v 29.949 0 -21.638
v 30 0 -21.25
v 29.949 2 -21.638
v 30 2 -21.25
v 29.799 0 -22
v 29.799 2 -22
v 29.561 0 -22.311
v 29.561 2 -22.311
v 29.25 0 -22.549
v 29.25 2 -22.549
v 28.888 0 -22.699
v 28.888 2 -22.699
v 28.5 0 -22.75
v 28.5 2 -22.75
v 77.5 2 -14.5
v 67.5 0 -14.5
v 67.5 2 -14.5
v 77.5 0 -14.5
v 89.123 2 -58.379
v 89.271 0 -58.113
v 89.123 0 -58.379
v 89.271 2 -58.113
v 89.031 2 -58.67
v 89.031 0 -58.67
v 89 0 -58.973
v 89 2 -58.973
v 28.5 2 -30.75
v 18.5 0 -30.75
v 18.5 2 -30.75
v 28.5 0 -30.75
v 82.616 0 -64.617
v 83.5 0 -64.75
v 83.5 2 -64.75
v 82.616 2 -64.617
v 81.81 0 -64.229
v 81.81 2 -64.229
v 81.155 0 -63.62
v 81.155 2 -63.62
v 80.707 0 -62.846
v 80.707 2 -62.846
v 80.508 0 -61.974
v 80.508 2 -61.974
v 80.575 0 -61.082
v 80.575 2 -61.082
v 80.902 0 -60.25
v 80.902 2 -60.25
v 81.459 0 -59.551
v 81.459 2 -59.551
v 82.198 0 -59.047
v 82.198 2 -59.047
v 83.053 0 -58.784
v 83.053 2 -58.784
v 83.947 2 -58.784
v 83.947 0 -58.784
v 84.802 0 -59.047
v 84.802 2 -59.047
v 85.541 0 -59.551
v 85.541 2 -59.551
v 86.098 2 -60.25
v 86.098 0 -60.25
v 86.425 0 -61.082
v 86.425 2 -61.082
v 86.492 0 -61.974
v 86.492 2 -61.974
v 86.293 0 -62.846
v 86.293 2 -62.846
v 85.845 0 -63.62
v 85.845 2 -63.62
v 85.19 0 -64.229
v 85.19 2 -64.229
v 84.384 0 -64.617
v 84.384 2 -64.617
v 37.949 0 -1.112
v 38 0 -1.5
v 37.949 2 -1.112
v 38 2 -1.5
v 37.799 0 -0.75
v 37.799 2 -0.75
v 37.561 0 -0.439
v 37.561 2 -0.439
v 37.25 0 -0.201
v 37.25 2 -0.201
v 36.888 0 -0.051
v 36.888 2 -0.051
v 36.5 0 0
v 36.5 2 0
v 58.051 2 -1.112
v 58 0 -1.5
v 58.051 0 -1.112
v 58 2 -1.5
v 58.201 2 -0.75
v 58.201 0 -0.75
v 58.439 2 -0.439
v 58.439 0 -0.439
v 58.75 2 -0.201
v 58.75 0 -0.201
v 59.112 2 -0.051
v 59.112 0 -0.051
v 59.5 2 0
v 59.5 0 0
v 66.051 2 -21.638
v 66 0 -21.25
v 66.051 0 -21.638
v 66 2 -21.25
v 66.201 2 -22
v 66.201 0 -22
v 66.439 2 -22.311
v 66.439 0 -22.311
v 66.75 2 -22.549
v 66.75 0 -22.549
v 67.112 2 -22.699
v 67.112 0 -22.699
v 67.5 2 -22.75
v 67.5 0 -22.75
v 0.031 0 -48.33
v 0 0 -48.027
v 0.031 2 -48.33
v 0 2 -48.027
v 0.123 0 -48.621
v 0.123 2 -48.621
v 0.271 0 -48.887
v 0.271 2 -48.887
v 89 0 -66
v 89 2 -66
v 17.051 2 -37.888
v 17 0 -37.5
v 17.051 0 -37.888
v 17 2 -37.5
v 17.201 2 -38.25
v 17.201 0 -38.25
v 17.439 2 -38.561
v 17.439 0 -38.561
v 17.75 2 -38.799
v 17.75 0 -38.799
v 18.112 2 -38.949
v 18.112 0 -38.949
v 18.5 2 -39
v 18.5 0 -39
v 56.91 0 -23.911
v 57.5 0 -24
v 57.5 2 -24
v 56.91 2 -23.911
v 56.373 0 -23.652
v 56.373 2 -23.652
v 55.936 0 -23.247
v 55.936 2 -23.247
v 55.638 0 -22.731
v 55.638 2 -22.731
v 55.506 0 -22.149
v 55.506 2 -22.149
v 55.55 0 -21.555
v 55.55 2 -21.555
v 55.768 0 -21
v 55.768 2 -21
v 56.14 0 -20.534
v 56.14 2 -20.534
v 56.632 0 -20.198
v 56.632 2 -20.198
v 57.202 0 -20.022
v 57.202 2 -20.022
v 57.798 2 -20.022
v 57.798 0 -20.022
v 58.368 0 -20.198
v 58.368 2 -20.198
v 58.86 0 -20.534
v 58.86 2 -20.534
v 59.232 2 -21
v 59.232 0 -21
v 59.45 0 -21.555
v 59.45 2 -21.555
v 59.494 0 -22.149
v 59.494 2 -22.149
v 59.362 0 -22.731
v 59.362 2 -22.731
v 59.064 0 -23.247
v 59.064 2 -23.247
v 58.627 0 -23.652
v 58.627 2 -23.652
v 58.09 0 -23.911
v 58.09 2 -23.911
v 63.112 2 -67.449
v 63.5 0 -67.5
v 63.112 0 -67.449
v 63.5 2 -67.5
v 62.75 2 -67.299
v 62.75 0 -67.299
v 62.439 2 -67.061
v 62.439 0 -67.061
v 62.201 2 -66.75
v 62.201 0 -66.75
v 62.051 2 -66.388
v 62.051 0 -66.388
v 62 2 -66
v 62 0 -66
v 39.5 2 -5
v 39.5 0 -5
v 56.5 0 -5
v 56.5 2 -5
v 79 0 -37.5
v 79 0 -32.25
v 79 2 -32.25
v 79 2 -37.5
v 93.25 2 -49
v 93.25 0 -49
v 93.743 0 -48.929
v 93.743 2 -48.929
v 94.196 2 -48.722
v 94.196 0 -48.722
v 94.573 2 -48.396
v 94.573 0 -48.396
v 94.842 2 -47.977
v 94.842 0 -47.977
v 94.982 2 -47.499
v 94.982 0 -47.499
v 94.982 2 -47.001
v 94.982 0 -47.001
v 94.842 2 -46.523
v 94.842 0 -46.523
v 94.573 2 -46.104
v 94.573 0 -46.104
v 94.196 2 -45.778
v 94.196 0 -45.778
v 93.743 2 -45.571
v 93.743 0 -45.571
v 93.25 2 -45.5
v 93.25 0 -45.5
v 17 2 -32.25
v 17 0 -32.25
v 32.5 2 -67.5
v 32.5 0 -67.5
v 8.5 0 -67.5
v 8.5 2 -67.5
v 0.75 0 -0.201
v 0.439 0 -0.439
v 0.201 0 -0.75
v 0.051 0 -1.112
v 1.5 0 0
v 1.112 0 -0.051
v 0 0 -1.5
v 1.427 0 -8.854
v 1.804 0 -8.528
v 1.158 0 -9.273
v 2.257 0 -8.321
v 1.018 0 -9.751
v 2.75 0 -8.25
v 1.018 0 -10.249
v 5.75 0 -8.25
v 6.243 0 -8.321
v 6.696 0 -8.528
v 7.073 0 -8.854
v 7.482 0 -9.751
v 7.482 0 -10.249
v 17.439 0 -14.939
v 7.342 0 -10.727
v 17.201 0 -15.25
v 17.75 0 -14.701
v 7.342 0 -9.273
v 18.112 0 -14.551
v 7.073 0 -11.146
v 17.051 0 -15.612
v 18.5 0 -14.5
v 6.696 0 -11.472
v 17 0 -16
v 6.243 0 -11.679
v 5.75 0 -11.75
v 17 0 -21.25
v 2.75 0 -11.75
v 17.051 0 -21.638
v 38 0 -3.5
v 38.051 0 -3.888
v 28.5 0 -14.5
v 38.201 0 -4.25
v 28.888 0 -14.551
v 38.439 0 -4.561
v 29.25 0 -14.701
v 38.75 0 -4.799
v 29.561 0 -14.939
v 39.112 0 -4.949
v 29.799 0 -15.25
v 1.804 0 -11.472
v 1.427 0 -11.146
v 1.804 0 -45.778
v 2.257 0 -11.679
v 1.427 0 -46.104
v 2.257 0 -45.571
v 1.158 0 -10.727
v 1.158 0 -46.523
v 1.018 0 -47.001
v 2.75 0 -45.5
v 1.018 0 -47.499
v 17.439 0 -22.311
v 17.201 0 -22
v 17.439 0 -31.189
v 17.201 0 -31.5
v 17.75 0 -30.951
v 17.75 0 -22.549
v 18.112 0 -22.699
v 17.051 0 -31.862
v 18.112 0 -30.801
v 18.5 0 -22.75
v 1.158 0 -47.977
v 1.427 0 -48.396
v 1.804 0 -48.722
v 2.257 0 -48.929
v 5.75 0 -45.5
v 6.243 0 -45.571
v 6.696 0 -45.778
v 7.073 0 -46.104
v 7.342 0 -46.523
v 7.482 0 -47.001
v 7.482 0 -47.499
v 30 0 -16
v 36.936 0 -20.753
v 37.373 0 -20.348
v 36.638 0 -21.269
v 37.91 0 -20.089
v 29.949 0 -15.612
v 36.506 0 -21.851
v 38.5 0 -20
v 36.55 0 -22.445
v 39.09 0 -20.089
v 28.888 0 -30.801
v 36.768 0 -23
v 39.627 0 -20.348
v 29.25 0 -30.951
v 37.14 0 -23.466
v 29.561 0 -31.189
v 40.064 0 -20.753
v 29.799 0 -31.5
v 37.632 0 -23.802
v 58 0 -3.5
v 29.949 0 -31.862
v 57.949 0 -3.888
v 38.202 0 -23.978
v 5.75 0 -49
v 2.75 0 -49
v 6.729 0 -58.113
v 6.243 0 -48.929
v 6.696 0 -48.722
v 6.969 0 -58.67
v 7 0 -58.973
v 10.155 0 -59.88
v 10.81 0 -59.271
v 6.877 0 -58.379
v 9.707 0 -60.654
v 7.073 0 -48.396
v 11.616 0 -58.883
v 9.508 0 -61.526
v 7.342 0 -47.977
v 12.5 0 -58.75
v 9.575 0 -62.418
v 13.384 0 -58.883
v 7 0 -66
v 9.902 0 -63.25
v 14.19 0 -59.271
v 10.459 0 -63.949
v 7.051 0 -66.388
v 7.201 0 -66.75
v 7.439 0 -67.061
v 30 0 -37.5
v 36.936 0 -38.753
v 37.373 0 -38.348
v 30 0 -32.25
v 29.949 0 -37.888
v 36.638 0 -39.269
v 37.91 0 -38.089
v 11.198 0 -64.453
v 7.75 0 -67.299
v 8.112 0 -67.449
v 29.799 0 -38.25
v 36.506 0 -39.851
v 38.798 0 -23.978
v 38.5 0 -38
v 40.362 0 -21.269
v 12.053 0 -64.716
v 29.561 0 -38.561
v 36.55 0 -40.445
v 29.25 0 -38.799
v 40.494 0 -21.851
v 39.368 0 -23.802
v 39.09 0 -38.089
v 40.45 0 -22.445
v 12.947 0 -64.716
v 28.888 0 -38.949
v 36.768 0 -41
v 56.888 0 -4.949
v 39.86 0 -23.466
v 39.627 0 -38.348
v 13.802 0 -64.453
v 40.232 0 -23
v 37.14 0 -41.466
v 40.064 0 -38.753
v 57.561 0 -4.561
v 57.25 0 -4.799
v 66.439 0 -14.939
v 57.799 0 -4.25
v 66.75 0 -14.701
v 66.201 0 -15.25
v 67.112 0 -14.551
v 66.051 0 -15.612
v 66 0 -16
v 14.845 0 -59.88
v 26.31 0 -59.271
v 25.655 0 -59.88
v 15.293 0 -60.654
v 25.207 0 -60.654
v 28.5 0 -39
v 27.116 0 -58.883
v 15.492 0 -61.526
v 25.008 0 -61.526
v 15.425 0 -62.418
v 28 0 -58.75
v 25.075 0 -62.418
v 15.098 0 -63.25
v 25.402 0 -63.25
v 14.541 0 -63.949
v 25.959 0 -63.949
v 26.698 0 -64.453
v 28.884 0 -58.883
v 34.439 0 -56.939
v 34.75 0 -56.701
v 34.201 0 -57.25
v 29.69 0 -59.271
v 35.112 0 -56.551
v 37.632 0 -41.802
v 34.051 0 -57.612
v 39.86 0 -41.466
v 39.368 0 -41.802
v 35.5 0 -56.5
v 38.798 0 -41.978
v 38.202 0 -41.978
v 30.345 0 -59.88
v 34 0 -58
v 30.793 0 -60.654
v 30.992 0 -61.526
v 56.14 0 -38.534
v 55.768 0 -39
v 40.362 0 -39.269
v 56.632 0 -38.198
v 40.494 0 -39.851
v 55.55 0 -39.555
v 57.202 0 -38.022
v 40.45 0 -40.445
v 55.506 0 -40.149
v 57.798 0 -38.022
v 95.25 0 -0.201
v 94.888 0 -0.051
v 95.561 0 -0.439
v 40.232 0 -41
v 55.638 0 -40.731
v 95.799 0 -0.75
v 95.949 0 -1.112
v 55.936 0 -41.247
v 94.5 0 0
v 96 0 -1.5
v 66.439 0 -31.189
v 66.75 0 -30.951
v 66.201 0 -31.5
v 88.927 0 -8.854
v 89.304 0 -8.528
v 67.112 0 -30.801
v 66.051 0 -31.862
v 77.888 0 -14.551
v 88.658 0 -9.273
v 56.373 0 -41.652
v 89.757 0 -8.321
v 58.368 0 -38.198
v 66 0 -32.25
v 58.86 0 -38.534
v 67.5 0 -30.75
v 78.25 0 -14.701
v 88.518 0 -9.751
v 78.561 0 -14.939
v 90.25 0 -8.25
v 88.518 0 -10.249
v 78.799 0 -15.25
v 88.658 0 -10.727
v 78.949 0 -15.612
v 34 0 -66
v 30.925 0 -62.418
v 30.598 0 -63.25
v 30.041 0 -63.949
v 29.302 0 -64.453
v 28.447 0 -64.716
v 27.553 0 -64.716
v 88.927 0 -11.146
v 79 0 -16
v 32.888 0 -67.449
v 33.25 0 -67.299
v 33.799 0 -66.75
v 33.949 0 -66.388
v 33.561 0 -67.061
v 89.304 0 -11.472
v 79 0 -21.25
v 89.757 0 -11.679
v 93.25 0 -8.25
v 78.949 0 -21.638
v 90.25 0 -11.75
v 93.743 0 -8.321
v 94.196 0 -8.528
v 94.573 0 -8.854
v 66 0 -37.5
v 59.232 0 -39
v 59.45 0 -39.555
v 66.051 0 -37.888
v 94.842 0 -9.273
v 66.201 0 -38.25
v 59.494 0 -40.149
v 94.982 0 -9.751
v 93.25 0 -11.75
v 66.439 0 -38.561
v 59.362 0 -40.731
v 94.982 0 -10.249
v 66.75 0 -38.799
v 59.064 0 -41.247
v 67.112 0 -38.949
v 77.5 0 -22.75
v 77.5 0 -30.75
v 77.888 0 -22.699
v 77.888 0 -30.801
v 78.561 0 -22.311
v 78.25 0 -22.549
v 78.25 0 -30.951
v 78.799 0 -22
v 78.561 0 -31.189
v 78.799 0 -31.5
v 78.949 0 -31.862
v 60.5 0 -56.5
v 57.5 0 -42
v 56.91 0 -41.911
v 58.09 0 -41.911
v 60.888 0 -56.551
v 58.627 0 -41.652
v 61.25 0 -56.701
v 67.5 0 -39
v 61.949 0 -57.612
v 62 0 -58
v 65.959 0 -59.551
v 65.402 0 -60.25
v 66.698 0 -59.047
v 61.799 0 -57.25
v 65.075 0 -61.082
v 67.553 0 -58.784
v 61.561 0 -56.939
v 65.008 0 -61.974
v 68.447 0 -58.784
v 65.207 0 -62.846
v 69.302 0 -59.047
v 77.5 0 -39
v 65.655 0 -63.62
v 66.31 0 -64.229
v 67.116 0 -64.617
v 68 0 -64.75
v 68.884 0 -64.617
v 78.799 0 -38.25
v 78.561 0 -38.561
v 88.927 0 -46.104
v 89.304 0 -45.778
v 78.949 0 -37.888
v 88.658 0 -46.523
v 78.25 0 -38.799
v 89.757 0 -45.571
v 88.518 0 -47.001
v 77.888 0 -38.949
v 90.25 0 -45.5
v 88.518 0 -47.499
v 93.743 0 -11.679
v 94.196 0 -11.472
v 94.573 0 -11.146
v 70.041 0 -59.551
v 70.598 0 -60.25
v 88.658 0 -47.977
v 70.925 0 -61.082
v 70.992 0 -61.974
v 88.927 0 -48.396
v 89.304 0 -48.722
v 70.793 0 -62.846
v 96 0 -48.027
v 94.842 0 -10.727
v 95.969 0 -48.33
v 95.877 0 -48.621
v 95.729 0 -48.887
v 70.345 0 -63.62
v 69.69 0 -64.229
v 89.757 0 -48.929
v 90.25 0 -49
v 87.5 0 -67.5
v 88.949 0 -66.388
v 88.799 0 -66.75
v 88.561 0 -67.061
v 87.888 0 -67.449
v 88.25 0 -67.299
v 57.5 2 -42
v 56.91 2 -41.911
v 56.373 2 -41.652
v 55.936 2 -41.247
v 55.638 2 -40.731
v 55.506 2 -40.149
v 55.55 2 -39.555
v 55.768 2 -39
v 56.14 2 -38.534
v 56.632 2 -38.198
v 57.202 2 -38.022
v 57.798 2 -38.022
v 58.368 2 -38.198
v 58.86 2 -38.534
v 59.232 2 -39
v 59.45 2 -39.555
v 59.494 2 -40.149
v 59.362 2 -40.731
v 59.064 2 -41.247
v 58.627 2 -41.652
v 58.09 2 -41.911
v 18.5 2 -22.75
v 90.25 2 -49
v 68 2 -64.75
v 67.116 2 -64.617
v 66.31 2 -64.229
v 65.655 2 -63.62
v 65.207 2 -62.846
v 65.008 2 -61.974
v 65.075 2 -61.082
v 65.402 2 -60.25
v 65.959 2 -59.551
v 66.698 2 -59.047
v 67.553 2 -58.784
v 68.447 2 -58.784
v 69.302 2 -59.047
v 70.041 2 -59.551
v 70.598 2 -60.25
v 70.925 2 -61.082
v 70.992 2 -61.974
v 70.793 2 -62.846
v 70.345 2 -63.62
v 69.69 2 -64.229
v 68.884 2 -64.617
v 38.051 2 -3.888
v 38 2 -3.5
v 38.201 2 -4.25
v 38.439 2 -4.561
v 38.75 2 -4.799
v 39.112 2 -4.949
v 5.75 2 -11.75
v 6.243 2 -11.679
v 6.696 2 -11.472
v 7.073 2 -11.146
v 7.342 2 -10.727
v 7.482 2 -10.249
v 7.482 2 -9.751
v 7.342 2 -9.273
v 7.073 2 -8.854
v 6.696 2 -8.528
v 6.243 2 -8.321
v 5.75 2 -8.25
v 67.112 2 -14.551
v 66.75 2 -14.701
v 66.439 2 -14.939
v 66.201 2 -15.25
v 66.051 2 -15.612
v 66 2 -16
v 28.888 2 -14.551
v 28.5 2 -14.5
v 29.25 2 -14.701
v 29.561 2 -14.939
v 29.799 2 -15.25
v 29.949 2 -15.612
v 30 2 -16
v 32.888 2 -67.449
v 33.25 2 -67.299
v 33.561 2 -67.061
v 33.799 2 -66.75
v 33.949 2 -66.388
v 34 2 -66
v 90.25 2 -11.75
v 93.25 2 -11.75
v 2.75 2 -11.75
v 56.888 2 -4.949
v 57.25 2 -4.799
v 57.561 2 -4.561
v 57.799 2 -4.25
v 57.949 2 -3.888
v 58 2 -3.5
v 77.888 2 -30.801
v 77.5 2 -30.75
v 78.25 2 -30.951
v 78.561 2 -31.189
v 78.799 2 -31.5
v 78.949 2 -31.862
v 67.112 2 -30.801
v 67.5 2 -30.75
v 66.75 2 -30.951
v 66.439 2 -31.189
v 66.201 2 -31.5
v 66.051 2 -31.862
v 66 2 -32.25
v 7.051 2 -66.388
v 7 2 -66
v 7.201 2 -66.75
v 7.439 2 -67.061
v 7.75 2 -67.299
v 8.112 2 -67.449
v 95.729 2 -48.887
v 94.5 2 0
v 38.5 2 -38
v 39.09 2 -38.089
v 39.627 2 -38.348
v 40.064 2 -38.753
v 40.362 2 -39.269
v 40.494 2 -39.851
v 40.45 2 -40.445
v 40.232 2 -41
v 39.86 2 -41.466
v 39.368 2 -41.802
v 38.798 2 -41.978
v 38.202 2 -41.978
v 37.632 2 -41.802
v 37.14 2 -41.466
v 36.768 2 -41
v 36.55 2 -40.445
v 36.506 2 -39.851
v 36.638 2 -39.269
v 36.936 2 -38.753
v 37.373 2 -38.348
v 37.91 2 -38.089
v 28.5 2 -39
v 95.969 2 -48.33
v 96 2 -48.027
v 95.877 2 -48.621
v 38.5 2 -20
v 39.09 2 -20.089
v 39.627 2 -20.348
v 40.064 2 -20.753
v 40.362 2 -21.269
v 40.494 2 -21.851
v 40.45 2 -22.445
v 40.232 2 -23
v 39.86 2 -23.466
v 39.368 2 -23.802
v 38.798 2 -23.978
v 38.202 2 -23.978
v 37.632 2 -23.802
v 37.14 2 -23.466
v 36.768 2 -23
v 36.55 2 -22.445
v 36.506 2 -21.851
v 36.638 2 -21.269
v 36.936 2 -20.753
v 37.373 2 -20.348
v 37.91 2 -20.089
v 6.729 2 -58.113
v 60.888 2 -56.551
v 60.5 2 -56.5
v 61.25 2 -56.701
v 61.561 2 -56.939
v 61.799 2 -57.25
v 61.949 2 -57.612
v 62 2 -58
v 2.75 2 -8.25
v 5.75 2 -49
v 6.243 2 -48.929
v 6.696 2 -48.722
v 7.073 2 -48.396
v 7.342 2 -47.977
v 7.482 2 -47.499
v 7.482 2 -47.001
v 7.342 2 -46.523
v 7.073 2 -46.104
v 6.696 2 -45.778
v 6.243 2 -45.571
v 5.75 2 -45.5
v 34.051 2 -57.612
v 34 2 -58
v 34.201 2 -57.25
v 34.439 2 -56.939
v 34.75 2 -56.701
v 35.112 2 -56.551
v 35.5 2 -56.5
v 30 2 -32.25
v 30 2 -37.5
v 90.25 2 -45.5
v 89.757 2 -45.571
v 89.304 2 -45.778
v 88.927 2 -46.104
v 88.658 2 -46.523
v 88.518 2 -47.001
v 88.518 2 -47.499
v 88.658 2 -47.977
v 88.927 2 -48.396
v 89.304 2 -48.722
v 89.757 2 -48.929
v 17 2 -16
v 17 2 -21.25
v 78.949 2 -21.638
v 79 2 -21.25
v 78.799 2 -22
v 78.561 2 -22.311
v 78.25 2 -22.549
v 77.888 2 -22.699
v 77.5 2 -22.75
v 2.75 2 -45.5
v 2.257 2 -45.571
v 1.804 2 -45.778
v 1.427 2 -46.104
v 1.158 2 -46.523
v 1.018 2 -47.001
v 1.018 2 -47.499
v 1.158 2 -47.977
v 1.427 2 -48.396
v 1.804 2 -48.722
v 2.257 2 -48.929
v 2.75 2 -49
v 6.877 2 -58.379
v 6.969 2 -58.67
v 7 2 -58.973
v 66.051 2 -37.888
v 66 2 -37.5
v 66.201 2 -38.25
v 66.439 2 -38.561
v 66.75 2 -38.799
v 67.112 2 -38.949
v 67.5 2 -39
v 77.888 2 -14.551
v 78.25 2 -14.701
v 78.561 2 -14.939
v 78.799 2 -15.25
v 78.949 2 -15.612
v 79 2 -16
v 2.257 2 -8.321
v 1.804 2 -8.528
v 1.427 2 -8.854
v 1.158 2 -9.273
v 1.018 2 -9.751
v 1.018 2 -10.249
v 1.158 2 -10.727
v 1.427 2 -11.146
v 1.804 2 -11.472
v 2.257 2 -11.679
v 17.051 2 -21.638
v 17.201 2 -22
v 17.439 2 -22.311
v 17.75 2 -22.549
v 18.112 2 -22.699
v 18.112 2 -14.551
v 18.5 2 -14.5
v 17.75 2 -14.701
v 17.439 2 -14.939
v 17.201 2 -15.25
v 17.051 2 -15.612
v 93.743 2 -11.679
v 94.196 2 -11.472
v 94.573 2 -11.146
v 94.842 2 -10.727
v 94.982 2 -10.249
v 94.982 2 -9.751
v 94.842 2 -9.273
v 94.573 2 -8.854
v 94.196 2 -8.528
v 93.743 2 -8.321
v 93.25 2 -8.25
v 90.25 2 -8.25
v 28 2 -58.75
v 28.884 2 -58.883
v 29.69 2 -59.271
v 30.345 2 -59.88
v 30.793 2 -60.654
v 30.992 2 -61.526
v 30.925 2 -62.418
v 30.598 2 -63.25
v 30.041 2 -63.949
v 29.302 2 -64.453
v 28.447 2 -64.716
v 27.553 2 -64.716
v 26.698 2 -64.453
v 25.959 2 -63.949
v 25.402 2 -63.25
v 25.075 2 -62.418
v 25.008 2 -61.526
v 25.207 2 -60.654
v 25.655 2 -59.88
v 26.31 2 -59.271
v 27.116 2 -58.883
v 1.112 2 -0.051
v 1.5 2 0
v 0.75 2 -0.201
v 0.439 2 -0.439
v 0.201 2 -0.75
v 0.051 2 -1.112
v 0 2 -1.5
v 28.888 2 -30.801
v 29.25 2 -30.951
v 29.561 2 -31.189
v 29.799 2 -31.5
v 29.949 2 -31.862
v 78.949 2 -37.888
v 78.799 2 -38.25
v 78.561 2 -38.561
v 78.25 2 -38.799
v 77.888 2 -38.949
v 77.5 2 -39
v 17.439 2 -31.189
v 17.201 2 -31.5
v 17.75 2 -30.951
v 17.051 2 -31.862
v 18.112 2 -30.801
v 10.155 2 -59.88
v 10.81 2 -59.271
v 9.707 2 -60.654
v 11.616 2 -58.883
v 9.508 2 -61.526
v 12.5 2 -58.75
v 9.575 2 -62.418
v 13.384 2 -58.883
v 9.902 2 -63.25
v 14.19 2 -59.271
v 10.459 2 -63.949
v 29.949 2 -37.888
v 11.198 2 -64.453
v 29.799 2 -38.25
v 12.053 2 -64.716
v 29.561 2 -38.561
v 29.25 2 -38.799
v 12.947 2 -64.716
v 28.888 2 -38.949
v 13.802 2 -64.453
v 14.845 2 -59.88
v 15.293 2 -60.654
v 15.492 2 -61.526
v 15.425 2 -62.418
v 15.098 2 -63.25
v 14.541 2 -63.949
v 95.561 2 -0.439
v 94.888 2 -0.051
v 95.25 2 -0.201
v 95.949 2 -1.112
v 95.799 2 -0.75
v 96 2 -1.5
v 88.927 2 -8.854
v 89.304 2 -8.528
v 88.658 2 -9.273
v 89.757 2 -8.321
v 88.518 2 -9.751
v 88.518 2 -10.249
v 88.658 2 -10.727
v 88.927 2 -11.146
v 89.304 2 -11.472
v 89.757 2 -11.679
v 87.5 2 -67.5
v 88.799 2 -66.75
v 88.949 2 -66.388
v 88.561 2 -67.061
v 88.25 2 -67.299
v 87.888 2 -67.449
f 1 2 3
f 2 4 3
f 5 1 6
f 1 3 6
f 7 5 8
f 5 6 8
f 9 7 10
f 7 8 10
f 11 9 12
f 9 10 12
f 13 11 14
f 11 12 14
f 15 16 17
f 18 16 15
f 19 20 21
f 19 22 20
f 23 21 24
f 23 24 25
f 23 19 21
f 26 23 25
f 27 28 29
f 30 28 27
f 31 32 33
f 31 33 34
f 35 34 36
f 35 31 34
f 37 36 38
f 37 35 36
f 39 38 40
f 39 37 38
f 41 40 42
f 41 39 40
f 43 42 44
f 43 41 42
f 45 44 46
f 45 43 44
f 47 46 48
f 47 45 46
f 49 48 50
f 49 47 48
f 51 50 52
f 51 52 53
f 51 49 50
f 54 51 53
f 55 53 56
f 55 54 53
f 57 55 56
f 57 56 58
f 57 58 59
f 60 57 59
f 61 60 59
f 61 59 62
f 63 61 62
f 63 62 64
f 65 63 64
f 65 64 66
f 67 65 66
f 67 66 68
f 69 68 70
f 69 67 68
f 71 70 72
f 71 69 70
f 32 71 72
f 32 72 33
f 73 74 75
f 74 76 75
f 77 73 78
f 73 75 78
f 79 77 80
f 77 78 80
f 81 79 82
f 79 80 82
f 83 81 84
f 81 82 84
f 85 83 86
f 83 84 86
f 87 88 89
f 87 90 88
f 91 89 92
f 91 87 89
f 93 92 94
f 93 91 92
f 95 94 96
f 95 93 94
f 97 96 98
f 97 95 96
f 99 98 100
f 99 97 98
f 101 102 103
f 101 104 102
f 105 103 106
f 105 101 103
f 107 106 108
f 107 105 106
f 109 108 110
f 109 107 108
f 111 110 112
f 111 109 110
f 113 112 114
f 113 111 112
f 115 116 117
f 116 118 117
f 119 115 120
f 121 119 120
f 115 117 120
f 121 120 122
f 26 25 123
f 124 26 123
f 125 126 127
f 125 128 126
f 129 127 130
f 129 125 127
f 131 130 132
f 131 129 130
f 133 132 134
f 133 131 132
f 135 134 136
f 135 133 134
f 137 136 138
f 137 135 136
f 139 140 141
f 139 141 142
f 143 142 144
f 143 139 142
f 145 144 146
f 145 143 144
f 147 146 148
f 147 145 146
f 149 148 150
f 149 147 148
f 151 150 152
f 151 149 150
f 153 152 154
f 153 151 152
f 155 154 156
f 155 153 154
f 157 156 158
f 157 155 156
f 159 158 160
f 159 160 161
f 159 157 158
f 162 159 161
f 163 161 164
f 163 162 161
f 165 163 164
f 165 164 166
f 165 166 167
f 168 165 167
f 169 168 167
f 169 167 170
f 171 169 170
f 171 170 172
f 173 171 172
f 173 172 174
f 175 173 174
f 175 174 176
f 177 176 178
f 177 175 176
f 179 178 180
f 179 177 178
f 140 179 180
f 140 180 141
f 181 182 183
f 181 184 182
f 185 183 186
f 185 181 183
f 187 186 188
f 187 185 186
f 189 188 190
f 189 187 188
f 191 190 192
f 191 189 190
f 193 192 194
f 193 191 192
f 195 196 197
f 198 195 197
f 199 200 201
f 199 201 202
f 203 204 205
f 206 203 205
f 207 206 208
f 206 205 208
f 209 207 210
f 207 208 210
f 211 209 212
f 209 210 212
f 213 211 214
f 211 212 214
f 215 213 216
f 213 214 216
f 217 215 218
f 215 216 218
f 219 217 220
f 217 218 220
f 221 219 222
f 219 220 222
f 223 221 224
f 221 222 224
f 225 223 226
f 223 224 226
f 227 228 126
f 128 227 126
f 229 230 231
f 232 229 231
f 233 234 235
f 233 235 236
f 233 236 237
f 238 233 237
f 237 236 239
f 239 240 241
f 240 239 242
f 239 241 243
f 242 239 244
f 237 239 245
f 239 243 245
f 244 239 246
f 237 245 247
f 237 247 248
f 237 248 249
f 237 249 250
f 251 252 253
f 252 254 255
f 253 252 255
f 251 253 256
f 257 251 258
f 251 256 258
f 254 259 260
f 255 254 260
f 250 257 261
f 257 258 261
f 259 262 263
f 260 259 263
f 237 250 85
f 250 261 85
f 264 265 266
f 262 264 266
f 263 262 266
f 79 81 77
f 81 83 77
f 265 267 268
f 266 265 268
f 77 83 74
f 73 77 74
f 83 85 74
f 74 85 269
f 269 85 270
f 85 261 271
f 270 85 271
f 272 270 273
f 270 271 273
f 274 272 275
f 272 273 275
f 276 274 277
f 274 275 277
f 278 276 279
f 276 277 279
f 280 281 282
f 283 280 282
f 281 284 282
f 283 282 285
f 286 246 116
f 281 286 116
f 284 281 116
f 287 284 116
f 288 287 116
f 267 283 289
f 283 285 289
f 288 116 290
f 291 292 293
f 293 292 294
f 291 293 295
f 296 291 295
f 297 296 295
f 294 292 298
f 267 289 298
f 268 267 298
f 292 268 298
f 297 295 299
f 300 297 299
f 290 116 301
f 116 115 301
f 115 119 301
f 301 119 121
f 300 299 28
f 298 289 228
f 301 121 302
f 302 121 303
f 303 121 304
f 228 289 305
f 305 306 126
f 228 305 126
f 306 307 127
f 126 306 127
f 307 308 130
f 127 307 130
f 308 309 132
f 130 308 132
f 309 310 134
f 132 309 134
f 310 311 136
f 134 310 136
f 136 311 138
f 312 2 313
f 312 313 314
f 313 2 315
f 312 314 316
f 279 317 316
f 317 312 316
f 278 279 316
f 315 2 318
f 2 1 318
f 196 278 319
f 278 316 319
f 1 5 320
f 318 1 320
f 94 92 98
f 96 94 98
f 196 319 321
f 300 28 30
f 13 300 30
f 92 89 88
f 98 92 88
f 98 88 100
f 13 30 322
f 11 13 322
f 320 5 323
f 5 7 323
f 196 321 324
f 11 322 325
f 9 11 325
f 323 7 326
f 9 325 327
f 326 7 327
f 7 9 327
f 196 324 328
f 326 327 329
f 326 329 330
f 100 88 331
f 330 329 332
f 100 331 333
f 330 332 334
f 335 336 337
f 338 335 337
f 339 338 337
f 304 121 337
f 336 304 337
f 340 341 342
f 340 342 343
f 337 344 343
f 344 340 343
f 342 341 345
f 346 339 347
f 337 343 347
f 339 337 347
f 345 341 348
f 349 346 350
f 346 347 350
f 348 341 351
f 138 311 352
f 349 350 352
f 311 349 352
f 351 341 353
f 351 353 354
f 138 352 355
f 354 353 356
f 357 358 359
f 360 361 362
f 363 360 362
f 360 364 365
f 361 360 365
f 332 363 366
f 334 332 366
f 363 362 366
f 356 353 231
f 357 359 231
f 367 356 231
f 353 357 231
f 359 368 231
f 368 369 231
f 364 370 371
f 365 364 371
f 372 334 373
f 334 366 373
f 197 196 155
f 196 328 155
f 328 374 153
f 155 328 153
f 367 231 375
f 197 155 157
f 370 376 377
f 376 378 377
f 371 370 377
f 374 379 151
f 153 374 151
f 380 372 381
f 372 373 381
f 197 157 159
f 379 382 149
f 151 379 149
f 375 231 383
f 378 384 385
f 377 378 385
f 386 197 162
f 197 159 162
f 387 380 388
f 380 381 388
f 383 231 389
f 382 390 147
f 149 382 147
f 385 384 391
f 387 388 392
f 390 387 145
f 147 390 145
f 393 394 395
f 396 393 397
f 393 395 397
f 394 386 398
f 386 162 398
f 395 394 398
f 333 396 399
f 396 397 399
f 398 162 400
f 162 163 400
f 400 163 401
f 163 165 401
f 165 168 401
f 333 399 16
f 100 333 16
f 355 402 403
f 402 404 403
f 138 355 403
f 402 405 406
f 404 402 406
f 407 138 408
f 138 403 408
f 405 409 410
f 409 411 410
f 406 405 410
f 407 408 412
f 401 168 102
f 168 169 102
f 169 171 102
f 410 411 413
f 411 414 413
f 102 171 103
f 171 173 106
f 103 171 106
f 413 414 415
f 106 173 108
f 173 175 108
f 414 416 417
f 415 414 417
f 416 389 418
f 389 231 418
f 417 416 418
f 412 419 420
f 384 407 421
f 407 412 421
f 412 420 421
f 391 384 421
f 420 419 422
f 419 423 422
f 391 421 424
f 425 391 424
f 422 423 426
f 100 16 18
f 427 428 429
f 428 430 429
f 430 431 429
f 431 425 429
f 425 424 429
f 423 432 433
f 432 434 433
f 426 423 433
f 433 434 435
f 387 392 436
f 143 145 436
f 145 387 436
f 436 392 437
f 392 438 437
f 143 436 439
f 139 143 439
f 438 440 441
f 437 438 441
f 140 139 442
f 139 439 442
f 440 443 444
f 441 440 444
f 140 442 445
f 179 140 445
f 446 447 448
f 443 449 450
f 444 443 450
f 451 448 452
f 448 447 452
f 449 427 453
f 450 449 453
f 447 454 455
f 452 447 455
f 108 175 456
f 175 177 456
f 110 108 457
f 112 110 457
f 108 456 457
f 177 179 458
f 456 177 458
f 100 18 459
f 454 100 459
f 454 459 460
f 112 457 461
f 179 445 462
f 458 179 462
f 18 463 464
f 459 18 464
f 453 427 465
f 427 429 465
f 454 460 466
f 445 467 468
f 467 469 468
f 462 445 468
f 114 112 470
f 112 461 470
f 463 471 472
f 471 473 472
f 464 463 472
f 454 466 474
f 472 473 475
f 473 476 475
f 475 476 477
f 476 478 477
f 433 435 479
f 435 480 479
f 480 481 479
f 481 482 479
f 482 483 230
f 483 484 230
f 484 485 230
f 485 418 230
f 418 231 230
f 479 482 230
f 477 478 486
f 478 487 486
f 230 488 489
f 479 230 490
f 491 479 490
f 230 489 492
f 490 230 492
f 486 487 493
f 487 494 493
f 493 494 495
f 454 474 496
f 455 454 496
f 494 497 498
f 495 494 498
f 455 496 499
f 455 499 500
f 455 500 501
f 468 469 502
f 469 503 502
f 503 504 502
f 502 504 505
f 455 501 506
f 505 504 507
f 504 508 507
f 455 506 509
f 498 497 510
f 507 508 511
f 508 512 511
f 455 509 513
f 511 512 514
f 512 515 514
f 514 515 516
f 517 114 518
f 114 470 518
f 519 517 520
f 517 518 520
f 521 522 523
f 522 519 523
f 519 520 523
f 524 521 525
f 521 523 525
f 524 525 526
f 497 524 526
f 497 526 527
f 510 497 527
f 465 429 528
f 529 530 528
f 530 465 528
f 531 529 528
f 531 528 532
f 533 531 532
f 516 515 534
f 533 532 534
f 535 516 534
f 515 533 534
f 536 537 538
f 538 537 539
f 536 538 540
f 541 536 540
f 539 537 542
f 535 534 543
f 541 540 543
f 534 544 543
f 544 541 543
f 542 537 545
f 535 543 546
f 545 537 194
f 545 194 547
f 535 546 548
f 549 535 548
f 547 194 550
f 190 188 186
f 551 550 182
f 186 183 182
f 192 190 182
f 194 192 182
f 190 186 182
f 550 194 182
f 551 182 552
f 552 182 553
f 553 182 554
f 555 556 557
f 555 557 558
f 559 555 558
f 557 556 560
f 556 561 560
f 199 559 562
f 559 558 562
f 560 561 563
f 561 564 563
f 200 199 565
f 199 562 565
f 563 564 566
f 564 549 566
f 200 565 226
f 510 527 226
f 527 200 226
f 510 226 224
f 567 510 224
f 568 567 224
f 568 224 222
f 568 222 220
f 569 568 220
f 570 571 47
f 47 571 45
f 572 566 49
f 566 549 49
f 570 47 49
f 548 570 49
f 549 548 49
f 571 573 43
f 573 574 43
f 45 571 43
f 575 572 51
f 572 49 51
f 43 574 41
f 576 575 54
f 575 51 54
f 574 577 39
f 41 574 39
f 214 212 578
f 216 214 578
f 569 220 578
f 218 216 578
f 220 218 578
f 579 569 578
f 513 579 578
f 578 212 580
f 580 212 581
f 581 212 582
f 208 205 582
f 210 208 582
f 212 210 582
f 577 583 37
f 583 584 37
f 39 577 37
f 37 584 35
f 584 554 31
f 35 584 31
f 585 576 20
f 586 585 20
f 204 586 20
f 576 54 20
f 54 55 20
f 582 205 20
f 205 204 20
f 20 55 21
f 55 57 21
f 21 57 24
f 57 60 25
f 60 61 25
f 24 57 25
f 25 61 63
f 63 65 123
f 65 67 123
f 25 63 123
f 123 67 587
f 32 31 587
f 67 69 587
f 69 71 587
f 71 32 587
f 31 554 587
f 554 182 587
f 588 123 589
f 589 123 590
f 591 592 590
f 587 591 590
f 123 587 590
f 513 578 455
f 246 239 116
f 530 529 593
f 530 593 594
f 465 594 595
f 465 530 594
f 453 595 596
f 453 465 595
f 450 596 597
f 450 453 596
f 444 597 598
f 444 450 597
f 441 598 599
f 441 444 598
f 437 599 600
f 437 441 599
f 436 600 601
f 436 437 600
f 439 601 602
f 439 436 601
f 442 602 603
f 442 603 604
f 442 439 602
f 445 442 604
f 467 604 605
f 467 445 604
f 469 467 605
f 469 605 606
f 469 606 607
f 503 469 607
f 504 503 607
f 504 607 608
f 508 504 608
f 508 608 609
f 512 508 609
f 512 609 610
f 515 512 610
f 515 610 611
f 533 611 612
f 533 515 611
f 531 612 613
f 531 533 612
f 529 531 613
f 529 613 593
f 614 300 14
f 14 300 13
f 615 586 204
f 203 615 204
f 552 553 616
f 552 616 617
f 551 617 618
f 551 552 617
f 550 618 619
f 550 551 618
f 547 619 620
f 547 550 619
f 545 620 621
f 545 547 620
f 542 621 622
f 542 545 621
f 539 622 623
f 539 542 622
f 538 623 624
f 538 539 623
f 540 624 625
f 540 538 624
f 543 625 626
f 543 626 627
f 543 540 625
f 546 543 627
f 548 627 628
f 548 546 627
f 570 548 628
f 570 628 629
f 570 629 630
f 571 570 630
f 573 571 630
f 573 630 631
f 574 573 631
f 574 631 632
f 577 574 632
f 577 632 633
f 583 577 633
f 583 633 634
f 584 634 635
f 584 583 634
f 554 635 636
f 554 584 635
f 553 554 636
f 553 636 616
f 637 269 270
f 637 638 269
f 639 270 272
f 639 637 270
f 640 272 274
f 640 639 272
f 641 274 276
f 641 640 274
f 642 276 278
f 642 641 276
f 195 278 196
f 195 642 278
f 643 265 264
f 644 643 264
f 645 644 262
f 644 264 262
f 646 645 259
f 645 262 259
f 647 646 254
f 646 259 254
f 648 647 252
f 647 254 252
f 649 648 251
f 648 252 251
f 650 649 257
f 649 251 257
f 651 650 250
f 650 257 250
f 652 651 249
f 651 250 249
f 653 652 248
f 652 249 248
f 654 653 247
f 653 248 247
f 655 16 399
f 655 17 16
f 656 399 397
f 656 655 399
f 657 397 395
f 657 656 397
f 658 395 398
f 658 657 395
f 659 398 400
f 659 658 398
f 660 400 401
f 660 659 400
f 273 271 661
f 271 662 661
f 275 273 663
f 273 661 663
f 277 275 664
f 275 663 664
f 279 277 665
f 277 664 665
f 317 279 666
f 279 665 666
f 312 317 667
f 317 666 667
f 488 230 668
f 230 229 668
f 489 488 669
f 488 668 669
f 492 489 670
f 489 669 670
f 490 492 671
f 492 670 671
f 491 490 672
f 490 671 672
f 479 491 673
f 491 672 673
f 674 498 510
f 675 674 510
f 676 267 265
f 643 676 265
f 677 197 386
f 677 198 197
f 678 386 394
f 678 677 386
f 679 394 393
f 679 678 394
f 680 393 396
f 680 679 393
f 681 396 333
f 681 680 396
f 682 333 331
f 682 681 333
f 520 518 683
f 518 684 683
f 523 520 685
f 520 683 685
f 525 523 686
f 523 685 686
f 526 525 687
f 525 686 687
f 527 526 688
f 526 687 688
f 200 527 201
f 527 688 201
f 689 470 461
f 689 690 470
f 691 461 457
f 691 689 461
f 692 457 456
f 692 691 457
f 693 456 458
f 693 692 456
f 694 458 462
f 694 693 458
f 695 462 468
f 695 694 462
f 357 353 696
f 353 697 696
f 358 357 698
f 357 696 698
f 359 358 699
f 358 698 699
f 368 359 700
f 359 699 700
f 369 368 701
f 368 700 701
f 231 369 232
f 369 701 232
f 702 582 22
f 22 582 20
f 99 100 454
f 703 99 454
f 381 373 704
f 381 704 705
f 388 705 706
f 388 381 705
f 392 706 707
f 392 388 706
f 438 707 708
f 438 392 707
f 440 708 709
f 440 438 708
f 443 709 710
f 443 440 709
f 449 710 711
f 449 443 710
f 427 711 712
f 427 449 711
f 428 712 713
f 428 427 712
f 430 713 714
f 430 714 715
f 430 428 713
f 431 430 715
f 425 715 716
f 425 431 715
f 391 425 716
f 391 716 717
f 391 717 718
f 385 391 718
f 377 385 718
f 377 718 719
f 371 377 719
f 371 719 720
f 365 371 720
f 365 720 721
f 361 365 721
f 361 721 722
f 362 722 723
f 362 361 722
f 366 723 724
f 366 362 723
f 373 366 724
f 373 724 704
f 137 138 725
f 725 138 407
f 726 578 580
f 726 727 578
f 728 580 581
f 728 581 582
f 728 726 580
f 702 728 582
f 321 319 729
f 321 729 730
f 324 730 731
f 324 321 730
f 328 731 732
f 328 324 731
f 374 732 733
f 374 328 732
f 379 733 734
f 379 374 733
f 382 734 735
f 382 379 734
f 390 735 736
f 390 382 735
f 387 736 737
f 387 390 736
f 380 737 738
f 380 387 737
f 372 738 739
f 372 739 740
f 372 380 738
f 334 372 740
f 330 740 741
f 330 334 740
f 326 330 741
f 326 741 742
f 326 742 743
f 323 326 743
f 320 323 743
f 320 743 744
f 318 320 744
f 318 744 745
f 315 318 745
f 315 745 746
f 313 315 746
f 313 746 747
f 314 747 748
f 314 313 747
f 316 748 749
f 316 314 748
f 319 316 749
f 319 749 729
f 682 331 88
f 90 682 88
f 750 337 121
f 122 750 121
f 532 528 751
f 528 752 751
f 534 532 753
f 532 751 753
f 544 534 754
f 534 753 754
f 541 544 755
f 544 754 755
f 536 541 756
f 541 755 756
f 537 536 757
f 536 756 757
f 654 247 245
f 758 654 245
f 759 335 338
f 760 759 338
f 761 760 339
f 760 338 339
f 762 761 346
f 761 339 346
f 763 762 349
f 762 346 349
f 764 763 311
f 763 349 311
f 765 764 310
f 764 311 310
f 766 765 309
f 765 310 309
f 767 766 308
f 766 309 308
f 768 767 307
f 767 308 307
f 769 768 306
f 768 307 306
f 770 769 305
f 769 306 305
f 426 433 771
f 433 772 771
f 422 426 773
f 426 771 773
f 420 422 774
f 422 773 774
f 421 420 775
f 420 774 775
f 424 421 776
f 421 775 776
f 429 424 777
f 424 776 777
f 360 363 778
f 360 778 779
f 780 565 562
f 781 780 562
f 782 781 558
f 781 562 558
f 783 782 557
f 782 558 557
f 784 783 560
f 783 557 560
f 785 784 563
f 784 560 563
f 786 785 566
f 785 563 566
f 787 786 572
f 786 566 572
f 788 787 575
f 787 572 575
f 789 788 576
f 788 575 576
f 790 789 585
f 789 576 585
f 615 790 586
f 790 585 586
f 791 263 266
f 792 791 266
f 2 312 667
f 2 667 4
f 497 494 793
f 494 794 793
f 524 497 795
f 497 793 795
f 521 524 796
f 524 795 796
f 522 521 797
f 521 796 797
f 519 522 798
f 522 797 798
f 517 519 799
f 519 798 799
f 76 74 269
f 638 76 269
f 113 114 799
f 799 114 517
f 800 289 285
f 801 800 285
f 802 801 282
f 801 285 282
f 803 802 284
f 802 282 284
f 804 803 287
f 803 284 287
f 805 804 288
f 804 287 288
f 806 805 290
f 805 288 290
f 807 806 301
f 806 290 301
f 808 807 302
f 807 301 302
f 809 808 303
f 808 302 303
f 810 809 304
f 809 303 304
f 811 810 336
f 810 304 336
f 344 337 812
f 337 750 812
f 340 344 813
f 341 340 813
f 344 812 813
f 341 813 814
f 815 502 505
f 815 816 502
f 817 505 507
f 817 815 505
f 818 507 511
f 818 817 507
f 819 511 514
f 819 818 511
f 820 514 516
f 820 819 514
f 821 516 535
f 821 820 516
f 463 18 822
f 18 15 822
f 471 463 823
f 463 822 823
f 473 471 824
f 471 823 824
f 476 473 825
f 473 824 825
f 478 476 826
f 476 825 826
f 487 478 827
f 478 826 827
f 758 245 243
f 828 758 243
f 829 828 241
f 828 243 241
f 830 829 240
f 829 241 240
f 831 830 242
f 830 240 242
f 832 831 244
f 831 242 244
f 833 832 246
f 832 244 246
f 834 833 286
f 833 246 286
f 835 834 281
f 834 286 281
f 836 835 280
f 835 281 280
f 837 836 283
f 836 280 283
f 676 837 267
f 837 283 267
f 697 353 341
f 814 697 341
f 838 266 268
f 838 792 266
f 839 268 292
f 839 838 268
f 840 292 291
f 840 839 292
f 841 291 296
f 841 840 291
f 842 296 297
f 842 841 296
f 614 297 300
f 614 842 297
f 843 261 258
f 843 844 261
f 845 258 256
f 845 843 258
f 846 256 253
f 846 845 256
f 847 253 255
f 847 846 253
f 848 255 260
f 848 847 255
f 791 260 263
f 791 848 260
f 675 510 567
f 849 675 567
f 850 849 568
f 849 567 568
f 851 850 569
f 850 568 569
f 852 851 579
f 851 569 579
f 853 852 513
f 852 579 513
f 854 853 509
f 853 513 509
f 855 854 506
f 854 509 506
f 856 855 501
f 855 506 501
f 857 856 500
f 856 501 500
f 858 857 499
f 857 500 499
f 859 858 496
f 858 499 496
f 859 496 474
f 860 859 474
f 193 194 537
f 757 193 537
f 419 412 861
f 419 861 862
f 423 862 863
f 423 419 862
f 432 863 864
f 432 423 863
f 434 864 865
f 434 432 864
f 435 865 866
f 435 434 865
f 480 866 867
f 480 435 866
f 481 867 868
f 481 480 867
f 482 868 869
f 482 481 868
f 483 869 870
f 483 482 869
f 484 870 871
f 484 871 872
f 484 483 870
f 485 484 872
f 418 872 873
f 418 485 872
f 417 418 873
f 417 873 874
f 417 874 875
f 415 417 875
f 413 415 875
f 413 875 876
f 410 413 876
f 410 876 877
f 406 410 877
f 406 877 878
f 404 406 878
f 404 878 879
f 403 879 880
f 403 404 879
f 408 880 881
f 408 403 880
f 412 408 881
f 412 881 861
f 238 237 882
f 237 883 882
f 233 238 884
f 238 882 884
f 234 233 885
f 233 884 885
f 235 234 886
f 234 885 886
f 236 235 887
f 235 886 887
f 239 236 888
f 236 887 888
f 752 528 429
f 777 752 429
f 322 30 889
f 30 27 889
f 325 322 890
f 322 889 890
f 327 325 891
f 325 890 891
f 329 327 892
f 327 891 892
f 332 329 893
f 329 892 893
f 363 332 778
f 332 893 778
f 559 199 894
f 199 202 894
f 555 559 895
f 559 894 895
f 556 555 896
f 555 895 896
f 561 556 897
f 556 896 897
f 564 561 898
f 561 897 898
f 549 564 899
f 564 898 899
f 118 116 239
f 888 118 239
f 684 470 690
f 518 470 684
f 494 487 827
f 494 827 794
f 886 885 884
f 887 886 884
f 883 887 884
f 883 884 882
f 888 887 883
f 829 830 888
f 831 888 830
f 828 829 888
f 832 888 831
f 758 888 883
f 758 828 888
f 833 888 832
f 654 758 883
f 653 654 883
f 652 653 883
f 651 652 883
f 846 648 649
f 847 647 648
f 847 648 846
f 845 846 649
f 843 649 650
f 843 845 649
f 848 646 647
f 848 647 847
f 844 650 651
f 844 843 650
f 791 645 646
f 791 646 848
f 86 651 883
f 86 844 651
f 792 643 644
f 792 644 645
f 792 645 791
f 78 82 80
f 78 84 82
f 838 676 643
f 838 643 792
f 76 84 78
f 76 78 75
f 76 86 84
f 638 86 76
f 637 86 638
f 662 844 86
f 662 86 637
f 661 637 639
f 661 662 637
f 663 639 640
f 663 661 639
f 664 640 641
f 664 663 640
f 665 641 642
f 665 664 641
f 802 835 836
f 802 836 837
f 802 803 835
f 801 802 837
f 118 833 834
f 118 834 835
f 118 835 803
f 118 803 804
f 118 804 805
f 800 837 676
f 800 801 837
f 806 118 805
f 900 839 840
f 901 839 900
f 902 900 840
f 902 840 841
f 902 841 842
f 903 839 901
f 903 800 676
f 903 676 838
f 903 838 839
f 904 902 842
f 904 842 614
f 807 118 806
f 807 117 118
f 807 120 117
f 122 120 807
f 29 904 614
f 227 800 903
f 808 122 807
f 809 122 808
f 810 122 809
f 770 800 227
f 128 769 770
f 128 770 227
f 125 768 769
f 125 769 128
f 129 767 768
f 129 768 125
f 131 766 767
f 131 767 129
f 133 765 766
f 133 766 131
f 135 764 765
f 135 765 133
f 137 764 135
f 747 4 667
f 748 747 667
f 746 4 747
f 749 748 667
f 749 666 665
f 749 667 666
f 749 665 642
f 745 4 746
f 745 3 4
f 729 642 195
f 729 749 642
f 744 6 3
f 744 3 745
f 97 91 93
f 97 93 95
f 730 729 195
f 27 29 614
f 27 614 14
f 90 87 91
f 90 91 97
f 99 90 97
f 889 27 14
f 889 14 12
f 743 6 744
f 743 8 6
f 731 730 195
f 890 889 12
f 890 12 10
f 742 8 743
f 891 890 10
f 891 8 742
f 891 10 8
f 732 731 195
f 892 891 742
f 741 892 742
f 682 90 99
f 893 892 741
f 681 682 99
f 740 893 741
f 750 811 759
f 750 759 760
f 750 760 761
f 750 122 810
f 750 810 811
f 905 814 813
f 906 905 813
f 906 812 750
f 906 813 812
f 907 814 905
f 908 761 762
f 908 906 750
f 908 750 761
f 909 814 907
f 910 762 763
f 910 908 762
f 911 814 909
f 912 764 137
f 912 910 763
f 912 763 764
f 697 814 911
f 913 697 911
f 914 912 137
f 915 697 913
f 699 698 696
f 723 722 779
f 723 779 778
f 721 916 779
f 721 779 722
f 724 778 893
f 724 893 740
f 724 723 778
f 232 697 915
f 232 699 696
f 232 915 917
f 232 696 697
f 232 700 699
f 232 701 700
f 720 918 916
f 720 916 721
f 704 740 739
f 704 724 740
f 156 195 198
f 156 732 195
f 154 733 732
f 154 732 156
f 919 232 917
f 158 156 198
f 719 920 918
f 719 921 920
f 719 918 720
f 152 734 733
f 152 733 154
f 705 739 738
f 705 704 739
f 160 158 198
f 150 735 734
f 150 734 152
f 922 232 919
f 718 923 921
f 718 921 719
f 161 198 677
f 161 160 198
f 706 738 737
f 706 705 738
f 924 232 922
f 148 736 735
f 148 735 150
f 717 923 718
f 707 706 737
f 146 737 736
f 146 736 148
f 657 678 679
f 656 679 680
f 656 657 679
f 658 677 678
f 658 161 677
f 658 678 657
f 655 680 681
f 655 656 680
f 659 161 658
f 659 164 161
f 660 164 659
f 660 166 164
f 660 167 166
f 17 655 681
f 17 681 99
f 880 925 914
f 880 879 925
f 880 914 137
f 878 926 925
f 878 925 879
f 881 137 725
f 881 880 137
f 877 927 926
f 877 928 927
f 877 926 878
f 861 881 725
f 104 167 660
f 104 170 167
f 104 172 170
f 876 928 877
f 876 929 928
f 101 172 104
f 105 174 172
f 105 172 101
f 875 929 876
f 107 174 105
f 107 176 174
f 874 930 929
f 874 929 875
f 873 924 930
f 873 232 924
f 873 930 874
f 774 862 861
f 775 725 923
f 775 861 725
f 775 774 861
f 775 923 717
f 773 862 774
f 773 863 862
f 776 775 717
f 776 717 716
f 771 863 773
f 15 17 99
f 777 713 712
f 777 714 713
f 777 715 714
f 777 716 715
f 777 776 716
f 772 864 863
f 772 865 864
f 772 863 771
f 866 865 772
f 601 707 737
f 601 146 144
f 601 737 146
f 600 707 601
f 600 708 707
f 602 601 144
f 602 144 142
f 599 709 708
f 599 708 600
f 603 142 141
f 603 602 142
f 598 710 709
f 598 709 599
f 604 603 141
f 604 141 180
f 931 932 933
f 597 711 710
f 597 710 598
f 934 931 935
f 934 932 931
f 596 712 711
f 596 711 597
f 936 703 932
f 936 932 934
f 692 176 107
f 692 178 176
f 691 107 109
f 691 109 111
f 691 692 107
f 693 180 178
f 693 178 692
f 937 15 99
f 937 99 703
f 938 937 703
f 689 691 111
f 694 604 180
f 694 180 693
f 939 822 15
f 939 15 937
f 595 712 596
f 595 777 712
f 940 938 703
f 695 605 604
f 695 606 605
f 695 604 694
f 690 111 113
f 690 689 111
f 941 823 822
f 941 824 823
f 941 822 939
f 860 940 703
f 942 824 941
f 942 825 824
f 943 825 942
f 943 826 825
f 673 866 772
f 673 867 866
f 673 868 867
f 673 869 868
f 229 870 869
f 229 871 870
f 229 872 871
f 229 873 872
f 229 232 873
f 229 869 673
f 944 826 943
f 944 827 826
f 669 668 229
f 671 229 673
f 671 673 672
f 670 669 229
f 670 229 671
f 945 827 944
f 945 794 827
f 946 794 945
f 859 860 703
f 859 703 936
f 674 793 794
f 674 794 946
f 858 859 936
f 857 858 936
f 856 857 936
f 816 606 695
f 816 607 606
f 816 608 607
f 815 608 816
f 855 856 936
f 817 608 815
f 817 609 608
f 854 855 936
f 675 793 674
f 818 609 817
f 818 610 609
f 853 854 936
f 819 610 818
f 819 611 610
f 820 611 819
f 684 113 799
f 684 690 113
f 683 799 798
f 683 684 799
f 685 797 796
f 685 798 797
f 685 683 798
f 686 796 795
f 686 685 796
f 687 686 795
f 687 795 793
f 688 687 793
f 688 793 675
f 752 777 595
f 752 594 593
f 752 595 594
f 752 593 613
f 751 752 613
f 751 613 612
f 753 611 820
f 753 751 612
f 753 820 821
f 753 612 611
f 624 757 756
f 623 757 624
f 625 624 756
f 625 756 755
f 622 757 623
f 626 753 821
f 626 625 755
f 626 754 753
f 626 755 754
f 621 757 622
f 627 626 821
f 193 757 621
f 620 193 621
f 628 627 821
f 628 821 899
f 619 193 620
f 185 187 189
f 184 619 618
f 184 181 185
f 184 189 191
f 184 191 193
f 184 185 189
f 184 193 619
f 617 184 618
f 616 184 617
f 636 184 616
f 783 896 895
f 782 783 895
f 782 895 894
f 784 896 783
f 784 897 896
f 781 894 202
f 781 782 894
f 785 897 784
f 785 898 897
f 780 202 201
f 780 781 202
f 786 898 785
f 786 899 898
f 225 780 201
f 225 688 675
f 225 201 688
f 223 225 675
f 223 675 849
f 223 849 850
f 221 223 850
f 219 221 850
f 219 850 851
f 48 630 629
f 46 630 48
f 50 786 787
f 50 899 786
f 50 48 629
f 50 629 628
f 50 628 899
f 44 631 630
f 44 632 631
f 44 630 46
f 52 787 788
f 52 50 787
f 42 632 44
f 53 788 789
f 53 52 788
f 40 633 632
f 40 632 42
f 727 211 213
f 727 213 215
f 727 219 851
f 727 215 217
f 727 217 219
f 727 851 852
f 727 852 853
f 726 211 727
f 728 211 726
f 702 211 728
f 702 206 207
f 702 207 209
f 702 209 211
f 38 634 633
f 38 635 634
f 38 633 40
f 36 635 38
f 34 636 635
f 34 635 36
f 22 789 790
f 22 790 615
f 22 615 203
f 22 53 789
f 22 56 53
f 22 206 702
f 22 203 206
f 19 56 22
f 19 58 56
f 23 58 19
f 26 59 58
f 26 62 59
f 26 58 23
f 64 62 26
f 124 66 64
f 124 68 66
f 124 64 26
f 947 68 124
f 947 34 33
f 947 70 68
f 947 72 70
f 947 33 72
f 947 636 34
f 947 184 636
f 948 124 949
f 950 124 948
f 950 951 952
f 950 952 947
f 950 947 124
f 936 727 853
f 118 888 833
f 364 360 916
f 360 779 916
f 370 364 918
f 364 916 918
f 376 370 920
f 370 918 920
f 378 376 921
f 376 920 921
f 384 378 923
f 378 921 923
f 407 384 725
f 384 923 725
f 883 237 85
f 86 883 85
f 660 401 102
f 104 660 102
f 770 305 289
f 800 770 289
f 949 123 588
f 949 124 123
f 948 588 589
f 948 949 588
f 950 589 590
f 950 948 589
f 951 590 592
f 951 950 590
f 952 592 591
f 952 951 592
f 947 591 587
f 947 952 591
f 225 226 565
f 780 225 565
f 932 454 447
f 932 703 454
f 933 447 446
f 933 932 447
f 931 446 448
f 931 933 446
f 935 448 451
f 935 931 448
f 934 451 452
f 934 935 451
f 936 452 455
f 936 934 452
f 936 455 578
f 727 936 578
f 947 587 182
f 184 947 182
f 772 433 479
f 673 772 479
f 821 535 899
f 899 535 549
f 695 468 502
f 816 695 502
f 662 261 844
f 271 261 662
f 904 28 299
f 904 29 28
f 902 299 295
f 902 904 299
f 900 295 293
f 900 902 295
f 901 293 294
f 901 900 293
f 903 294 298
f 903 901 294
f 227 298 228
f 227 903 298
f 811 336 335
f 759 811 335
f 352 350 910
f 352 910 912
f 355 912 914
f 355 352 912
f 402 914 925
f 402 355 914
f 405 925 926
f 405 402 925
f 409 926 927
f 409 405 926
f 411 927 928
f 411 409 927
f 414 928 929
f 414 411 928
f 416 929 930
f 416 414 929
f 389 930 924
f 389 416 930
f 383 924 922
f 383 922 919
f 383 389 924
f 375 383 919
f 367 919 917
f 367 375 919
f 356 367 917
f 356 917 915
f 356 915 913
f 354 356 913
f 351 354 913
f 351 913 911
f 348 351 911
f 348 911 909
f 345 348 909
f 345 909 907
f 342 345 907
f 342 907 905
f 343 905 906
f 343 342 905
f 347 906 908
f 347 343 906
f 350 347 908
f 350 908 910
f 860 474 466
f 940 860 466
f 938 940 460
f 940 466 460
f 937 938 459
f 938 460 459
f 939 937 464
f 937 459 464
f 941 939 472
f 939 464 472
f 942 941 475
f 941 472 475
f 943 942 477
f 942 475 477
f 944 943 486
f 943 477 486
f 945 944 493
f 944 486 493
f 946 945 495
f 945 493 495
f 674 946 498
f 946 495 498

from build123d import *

# Parameters (mm, degrees)
SKETCH1_R           = 2
SKETCH1_R_2         = 3
SKETCH1_W           = 13
SKETCH1_H           = 8.25
BOSS_EXTRUDE1_DEPTH = 2
FILLET1_R           = 1.5


with BuildPart() as part:
    # Sketch1 → Boss-Extrude1 (new body)
    with BuildSketch(Plane(origin=(0, 0, 0), x_dir=(1, 0, 0), z_dir=(0, 1, 0))):
        Polygon((38, 0), (38, 5), (58, 5), (58, 0), (96, 0), (96, 48.5), (89, 58.5), (89, 67.5), (62, 67.5), (62, 56.5), (34, 56.5), (34, 67.5), (7, 67.5), (7, 58.5), (0, 48.5), (0, 0), align=None)
        with Locations(Location((38.5, 40, 0), (0, 0, 270))):
            Circle(SKETCH1_R, mode=Mode.SUBTRACT)
        with Locations(Location((38.5, 22, 0), (0, 0, 270))):
            Circle(SKETCH1_R, mode=Mode.SUBTRACT)
        with Locations(Location((57.5, 22, 0), (0, 0, 90))):
            Circle(SKETCH1_R, mode=Mode.SUBTRACT)
        with Locations(Location((57.5, 40, 0), (0, 0, 90))):
            Circle(SKETCH1_R, mode=Mode.SUBTRACT)
        with Locations(Location((12.5, 61.75, 0), (0, 0, 270))):
            Circle(SKETCH1_R_2, mode=Mode.SUBTRACT)
        with Locations(Location((28, 61.75, 0), (0, 0, 270))):
            Circle(SKETCH1_R_2, mode=Mode.SUBTRACT)
        with Locations(Location((68, 61.75, 0), (0, 0, 90))):
            Circle(SKETCH1_R_2, mode=Mode.SUBTRACT)
        with Locations(Location((83.5, 61.75, 0), (0, 0, 90))):
            Circle(SKETCH1_R_2, mode=Mode.SUBTRACT)
        with Locations((72.5, 18.625)):
            Rectangle(SKETCH1_W, SKETCH1_H, mode=Mode.SUBTRACT)
        with Locations((23.5, 34.875)):
            Rectangle(SKETCH1_W, SKETCH1_H, mode=Mode.SUBTRACT)
        with Locations((23.5, 18.625)):
            Rectangle(SKETCH1_W, SKETCH1_H, mode=Mode.SUBTRACT)
        with Locations((72.5, 34.875)):
            Rectangle(SKETCH1_W, SKETCH1_H, mode=Mode.SUBTRACT)
        with BuildLine():
            Line((2.75, 11.75), (5.75, 11.75))
            ThreePointArc((5.75, 11.75), (7.5, 10), (5.75, 8.25))
            Line((5.75, 8.25), (2.75, 8.25))
            ThreePointArc((2.75, 8.25), (1, 10), (2.75, 11.75))
        make_face(mode=Mode.SUBTRACT)
        with BuildLine():
            Line((93.25, 8.25), (90.25, 8.25))
            ThreePointArc((90.25, 8.25), (88.5, 10), (90.25, 11.75))
            Line((90.25, 11.75), (93.25, 11.75))
            ThreePointArc((93.25, 11.75), (95, 10), (93.25, 8.25))
        make_face(mode=Mode.SUBTRACT)
        with BuildLine():
            Line((93.25, 45.5), (90.25, 45.5))
            ThreePointArc((90.25, 45.5), (88.5, 47.25), (90.25, 49))
            Line((90.25, 49), (93.25, 49))
            ThreePointArc((93.25, 49), (95, 47.25), (93.25, 45.5))
        make_face(mode=Mode.SUBTRACT)
        with BuildLine():
            Line((2.75, 49), (5.75, 49))
            ThreePointArc((5.75, 49), (7.5, 47.25), (5.75, 45.5))
            Line((5.75, 45.5), (2.75, 45.5))
            ThreePointArc((2.75, 45.5), (1, 47.25), (2.75, 49))
        make_face(mode=Mode.SUBTRACT)
    extrude(amount=BOSS_EXTRUDE1_DEPTH)

    # Fillet1
    fillet1_edges = [part.edges().sort_by_distance(p)[0] for p in [
        (0, 1, -48.5),
        (7, 1, -58.5),
        (7, 1, -67.5),
        (34, 1, -67.5),
        (34, 1, -56.5),
        (62, 1, -56.5),
        (62, 1, -67.5),
        (89, 1, -67.5),
        (89, 1, -58.5),
        (96, 1, -48.5),
        (96, 1, 0),
        (58, 1, 0),
        (58, 1, -5),
        (38, 1, -5),
        (38, 1, 0),
        (0, 1, 0),
        (17, 1, -39),
        (17, 1, -30.75),
        (30, 1, -30.75),
        (30, 1, -39),
        (17, 1, -22.75),
        (17, 1, -14.5),
        (30, 1, -14.5),
        (30, 1, -22.75),
        (79, 1, -14.5),
        (79, 1, -22.75),
        (66, 1, -22.75),
        (66, 1, -14.5),
        (79, 1, -30.75),
        (79, 1, -39),
        (66, 1, -39),
        (66, 1, -30.75),
    ]]
    fillet(fillet1_edges, radius=FILLET1_R)


solid = part.part
